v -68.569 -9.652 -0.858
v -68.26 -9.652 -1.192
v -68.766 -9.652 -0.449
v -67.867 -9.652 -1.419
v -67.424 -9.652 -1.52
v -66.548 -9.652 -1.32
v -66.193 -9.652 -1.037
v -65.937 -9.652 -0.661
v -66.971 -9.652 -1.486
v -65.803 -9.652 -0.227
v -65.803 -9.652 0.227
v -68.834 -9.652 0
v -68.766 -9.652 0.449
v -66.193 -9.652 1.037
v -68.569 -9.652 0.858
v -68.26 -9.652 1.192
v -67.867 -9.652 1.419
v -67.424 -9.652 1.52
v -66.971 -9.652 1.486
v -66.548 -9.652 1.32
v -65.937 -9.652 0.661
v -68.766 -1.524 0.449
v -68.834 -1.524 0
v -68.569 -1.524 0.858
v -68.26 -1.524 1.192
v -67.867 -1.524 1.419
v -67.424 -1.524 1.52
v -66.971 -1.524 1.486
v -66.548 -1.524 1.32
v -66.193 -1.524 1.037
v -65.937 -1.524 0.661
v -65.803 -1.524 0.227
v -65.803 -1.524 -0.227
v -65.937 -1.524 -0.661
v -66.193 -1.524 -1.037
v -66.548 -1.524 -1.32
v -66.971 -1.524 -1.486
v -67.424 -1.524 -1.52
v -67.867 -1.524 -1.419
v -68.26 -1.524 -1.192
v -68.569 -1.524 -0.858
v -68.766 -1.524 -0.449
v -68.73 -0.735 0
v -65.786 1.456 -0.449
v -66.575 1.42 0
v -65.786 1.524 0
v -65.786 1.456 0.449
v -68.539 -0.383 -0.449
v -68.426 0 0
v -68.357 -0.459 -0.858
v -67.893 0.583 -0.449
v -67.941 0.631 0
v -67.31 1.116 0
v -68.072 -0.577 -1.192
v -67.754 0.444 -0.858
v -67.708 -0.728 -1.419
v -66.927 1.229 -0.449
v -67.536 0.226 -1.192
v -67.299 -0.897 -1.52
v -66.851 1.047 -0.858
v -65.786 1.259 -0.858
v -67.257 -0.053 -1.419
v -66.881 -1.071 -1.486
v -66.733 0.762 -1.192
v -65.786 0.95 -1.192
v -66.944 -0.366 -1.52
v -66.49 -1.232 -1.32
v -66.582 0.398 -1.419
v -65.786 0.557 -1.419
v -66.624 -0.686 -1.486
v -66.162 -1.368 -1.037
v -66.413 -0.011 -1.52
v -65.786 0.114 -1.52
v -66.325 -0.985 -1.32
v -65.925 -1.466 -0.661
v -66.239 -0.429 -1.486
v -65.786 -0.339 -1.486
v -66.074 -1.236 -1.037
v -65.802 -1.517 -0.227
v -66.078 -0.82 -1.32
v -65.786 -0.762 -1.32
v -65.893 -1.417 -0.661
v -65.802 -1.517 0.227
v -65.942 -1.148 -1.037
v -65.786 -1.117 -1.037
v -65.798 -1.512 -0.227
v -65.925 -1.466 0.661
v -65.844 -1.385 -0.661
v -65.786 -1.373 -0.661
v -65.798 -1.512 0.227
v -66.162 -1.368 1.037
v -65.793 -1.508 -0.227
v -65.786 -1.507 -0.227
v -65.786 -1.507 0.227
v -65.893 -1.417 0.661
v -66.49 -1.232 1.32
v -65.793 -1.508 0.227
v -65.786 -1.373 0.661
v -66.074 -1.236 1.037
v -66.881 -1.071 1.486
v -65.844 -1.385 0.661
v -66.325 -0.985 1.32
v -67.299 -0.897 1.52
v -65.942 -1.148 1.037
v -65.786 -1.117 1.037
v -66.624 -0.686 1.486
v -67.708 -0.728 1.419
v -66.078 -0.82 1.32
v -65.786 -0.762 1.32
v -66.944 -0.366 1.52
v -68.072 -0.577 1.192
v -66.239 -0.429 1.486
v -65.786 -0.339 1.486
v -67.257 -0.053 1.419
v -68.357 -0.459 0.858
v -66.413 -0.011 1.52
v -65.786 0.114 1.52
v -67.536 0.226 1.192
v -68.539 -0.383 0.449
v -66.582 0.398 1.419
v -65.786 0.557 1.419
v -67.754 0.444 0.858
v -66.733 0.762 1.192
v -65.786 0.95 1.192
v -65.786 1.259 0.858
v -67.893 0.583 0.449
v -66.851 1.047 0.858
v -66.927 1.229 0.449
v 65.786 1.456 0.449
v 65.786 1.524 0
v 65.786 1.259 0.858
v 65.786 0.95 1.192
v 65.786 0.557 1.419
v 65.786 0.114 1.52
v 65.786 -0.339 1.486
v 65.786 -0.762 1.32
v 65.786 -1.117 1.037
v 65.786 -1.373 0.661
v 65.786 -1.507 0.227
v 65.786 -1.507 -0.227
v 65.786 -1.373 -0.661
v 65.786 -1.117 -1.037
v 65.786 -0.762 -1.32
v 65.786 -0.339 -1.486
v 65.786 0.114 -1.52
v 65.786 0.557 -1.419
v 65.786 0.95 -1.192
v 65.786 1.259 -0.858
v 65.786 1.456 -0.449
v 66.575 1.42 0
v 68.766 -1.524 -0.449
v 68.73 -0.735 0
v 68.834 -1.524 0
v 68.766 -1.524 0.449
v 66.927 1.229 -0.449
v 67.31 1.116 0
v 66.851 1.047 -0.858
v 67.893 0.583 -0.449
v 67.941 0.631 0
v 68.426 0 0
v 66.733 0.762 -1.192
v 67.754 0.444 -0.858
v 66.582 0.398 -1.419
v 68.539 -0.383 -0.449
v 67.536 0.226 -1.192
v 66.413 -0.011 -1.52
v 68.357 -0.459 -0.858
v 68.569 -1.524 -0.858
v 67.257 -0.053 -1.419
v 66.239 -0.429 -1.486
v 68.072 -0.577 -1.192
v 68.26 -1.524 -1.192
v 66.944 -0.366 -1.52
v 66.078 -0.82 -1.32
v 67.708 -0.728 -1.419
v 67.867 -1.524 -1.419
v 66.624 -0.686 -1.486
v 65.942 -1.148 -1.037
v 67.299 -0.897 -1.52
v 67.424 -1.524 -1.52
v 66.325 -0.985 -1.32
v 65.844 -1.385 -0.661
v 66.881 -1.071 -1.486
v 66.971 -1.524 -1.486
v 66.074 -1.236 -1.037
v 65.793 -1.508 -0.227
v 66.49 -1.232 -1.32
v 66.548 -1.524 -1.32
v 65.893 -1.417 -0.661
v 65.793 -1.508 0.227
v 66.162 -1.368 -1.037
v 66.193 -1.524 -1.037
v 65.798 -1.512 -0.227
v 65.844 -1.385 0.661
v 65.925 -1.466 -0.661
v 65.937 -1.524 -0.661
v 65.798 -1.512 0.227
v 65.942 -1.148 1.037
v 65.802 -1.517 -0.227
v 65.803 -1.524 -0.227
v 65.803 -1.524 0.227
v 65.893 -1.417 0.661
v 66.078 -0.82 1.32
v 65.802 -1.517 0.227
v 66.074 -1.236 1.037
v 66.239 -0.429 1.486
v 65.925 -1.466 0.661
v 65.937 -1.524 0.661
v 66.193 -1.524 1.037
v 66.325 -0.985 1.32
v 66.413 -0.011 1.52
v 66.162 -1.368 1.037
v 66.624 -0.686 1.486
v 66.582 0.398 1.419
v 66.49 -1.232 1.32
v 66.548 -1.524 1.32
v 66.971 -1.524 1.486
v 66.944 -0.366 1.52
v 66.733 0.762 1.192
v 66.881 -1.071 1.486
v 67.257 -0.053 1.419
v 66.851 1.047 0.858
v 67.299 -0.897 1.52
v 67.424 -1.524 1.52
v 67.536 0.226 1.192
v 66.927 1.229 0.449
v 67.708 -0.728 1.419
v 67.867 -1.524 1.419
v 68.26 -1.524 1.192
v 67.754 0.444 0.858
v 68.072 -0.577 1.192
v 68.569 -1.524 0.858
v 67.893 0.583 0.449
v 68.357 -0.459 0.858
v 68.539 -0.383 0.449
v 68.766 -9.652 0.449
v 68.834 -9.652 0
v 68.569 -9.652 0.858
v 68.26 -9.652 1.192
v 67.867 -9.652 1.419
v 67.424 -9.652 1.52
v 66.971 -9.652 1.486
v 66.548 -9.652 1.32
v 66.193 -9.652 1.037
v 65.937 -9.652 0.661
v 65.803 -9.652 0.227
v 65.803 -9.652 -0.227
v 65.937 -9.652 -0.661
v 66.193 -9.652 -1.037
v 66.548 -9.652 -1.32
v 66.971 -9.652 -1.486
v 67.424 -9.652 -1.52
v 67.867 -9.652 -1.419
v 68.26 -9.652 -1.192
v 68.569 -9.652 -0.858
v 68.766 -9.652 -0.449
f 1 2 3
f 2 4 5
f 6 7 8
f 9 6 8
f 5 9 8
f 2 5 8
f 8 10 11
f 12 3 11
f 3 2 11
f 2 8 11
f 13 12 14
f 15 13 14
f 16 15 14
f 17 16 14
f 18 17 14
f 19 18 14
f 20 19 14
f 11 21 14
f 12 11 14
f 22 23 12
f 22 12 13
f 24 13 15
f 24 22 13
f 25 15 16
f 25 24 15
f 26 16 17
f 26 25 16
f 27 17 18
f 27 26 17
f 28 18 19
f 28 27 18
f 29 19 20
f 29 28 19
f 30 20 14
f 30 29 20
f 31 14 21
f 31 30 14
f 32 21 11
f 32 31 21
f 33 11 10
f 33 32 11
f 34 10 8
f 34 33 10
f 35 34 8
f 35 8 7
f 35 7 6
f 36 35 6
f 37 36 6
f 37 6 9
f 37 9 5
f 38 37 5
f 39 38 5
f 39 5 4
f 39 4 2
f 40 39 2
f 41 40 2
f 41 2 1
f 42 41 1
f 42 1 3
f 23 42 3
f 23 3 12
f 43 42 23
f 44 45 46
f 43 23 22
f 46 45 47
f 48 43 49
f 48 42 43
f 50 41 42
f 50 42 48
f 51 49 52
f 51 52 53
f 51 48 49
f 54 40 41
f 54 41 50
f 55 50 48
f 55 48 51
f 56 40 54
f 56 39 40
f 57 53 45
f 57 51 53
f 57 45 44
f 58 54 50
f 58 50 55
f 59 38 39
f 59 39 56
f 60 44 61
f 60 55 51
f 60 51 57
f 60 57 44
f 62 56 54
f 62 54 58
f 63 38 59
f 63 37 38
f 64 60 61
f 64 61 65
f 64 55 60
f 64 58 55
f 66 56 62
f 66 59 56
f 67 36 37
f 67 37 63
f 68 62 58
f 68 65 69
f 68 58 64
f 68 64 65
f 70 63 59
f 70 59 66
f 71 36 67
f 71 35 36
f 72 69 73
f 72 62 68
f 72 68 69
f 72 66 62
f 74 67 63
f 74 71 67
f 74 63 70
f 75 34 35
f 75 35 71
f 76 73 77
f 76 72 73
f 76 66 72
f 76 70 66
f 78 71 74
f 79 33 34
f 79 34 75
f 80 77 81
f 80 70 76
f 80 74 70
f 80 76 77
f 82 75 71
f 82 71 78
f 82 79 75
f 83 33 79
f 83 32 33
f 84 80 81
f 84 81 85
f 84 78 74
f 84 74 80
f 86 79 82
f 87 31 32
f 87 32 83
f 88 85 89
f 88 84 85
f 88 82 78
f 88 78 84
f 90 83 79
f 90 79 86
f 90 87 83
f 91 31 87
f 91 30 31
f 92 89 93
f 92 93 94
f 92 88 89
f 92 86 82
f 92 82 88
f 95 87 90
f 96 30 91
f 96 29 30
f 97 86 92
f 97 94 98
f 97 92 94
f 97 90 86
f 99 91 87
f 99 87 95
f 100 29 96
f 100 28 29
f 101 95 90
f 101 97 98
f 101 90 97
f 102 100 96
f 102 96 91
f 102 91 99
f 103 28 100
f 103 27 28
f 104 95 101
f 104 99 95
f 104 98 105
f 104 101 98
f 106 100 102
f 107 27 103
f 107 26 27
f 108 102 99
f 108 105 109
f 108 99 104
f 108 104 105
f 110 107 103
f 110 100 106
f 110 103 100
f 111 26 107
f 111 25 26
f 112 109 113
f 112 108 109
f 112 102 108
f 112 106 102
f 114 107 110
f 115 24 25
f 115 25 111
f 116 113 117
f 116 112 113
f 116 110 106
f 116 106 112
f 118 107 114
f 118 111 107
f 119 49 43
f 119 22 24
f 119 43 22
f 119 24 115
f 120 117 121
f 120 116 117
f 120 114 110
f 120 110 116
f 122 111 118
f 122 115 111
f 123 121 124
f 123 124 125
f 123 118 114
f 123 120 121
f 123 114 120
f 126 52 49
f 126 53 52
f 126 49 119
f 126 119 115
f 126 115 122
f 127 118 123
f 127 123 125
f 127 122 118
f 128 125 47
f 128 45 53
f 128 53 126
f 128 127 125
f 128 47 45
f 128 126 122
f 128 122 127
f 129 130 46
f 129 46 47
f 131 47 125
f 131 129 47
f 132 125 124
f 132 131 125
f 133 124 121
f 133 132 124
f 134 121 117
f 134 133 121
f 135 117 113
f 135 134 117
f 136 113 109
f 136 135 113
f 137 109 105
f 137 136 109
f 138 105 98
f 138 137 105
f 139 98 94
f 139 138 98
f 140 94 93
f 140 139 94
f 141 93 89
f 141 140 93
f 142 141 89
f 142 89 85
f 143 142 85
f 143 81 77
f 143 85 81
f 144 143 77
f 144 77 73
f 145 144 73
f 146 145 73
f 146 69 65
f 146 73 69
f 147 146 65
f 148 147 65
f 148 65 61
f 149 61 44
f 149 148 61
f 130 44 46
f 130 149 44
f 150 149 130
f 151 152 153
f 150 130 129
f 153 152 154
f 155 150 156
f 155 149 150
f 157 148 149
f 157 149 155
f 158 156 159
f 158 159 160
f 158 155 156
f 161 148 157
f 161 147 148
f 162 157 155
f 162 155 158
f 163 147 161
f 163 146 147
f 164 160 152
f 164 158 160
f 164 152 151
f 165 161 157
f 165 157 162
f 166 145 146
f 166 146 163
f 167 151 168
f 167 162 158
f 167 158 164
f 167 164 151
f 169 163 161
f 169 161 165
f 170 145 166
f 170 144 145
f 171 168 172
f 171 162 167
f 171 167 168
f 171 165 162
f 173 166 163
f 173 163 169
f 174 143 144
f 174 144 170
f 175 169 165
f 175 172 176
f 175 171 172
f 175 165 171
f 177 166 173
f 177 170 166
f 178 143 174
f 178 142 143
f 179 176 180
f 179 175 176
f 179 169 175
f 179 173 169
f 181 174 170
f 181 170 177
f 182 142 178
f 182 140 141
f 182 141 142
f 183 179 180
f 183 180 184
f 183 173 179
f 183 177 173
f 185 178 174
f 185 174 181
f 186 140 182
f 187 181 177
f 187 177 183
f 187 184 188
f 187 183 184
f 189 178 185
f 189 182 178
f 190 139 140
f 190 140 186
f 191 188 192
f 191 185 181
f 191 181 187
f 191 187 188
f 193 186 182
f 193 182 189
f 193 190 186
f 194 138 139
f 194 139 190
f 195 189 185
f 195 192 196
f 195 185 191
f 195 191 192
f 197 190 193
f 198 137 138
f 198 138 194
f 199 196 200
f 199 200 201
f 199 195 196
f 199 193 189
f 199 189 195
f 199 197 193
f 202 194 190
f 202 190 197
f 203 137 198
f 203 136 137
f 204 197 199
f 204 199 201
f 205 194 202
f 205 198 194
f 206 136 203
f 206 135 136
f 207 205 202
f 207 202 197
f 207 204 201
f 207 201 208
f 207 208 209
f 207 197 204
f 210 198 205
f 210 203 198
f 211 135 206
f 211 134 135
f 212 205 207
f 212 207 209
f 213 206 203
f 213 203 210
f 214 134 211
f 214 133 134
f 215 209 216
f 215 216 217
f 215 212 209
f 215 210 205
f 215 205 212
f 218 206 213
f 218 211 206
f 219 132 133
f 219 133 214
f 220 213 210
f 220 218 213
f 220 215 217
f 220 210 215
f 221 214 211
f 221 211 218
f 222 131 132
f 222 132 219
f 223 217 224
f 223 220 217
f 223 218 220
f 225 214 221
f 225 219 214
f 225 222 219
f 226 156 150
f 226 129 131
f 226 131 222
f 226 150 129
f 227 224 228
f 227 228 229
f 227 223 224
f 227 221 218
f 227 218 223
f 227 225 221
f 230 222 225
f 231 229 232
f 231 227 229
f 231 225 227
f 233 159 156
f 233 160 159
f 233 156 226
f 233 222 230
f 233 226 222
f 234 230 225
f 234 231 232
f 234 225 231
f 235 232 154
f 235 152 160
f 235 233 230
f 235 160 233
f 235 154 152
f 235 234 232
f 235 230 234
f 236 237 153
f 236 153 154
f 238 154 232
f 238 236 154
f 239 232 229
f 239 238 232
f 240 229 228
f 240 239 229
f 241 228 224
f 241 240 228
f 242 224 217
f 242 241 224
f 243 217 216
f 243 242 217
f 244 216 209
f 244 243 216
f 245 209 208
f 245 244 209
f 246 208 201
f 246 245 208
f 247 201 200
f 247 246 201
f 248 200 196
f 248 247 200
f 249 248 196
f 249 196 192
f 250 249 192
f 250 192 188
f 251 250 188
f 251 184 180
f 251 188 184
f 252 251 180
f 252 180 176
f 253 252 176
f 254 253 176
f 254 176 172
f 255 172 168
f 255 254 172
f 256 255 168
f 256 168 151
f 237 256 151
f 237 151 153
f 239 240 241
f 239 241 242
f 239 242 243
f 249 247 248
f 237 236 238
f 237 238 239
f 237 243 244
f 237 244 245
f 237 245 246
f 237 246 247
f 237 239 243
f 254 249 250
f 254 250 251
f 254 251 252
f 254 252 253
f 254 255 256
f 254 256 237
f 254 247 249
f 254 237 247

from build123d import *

# Parameters (mm, degrees)
SKETCH5_R = 1.524


with BuildPart() as part:
    # Sweep1: sweep along a path in Sketch1
    with BuildLine(Plane.XY) as sweep1_path:
        Line((-67.31, -9.652), (-67.31, -1.524))
        ThreePointArc((-67.31, -1.524), (-66.863630735, -0.446369265), (-65.786, 0))
        Line((-65.786, 0), (65.786, 0))
        ThreePointArc((65.786, 0), (66.863630735, -0.446369265), (67.31, -1.524))
        Line((67.31, -1.524), (67.31, -9.652))
    # Sketch5 → Sweep1 (sweep)
    with BuildSketch(Plane(origin=(0, -9.652, 0), x_dir=(-1, 0, 0), z_dir=(0, 1, 0))):
        with Locations((67.31, 0)):
            Circle(SKETCH5_R)
    sweep(path=sweep1_path.line)


solid = part.part
